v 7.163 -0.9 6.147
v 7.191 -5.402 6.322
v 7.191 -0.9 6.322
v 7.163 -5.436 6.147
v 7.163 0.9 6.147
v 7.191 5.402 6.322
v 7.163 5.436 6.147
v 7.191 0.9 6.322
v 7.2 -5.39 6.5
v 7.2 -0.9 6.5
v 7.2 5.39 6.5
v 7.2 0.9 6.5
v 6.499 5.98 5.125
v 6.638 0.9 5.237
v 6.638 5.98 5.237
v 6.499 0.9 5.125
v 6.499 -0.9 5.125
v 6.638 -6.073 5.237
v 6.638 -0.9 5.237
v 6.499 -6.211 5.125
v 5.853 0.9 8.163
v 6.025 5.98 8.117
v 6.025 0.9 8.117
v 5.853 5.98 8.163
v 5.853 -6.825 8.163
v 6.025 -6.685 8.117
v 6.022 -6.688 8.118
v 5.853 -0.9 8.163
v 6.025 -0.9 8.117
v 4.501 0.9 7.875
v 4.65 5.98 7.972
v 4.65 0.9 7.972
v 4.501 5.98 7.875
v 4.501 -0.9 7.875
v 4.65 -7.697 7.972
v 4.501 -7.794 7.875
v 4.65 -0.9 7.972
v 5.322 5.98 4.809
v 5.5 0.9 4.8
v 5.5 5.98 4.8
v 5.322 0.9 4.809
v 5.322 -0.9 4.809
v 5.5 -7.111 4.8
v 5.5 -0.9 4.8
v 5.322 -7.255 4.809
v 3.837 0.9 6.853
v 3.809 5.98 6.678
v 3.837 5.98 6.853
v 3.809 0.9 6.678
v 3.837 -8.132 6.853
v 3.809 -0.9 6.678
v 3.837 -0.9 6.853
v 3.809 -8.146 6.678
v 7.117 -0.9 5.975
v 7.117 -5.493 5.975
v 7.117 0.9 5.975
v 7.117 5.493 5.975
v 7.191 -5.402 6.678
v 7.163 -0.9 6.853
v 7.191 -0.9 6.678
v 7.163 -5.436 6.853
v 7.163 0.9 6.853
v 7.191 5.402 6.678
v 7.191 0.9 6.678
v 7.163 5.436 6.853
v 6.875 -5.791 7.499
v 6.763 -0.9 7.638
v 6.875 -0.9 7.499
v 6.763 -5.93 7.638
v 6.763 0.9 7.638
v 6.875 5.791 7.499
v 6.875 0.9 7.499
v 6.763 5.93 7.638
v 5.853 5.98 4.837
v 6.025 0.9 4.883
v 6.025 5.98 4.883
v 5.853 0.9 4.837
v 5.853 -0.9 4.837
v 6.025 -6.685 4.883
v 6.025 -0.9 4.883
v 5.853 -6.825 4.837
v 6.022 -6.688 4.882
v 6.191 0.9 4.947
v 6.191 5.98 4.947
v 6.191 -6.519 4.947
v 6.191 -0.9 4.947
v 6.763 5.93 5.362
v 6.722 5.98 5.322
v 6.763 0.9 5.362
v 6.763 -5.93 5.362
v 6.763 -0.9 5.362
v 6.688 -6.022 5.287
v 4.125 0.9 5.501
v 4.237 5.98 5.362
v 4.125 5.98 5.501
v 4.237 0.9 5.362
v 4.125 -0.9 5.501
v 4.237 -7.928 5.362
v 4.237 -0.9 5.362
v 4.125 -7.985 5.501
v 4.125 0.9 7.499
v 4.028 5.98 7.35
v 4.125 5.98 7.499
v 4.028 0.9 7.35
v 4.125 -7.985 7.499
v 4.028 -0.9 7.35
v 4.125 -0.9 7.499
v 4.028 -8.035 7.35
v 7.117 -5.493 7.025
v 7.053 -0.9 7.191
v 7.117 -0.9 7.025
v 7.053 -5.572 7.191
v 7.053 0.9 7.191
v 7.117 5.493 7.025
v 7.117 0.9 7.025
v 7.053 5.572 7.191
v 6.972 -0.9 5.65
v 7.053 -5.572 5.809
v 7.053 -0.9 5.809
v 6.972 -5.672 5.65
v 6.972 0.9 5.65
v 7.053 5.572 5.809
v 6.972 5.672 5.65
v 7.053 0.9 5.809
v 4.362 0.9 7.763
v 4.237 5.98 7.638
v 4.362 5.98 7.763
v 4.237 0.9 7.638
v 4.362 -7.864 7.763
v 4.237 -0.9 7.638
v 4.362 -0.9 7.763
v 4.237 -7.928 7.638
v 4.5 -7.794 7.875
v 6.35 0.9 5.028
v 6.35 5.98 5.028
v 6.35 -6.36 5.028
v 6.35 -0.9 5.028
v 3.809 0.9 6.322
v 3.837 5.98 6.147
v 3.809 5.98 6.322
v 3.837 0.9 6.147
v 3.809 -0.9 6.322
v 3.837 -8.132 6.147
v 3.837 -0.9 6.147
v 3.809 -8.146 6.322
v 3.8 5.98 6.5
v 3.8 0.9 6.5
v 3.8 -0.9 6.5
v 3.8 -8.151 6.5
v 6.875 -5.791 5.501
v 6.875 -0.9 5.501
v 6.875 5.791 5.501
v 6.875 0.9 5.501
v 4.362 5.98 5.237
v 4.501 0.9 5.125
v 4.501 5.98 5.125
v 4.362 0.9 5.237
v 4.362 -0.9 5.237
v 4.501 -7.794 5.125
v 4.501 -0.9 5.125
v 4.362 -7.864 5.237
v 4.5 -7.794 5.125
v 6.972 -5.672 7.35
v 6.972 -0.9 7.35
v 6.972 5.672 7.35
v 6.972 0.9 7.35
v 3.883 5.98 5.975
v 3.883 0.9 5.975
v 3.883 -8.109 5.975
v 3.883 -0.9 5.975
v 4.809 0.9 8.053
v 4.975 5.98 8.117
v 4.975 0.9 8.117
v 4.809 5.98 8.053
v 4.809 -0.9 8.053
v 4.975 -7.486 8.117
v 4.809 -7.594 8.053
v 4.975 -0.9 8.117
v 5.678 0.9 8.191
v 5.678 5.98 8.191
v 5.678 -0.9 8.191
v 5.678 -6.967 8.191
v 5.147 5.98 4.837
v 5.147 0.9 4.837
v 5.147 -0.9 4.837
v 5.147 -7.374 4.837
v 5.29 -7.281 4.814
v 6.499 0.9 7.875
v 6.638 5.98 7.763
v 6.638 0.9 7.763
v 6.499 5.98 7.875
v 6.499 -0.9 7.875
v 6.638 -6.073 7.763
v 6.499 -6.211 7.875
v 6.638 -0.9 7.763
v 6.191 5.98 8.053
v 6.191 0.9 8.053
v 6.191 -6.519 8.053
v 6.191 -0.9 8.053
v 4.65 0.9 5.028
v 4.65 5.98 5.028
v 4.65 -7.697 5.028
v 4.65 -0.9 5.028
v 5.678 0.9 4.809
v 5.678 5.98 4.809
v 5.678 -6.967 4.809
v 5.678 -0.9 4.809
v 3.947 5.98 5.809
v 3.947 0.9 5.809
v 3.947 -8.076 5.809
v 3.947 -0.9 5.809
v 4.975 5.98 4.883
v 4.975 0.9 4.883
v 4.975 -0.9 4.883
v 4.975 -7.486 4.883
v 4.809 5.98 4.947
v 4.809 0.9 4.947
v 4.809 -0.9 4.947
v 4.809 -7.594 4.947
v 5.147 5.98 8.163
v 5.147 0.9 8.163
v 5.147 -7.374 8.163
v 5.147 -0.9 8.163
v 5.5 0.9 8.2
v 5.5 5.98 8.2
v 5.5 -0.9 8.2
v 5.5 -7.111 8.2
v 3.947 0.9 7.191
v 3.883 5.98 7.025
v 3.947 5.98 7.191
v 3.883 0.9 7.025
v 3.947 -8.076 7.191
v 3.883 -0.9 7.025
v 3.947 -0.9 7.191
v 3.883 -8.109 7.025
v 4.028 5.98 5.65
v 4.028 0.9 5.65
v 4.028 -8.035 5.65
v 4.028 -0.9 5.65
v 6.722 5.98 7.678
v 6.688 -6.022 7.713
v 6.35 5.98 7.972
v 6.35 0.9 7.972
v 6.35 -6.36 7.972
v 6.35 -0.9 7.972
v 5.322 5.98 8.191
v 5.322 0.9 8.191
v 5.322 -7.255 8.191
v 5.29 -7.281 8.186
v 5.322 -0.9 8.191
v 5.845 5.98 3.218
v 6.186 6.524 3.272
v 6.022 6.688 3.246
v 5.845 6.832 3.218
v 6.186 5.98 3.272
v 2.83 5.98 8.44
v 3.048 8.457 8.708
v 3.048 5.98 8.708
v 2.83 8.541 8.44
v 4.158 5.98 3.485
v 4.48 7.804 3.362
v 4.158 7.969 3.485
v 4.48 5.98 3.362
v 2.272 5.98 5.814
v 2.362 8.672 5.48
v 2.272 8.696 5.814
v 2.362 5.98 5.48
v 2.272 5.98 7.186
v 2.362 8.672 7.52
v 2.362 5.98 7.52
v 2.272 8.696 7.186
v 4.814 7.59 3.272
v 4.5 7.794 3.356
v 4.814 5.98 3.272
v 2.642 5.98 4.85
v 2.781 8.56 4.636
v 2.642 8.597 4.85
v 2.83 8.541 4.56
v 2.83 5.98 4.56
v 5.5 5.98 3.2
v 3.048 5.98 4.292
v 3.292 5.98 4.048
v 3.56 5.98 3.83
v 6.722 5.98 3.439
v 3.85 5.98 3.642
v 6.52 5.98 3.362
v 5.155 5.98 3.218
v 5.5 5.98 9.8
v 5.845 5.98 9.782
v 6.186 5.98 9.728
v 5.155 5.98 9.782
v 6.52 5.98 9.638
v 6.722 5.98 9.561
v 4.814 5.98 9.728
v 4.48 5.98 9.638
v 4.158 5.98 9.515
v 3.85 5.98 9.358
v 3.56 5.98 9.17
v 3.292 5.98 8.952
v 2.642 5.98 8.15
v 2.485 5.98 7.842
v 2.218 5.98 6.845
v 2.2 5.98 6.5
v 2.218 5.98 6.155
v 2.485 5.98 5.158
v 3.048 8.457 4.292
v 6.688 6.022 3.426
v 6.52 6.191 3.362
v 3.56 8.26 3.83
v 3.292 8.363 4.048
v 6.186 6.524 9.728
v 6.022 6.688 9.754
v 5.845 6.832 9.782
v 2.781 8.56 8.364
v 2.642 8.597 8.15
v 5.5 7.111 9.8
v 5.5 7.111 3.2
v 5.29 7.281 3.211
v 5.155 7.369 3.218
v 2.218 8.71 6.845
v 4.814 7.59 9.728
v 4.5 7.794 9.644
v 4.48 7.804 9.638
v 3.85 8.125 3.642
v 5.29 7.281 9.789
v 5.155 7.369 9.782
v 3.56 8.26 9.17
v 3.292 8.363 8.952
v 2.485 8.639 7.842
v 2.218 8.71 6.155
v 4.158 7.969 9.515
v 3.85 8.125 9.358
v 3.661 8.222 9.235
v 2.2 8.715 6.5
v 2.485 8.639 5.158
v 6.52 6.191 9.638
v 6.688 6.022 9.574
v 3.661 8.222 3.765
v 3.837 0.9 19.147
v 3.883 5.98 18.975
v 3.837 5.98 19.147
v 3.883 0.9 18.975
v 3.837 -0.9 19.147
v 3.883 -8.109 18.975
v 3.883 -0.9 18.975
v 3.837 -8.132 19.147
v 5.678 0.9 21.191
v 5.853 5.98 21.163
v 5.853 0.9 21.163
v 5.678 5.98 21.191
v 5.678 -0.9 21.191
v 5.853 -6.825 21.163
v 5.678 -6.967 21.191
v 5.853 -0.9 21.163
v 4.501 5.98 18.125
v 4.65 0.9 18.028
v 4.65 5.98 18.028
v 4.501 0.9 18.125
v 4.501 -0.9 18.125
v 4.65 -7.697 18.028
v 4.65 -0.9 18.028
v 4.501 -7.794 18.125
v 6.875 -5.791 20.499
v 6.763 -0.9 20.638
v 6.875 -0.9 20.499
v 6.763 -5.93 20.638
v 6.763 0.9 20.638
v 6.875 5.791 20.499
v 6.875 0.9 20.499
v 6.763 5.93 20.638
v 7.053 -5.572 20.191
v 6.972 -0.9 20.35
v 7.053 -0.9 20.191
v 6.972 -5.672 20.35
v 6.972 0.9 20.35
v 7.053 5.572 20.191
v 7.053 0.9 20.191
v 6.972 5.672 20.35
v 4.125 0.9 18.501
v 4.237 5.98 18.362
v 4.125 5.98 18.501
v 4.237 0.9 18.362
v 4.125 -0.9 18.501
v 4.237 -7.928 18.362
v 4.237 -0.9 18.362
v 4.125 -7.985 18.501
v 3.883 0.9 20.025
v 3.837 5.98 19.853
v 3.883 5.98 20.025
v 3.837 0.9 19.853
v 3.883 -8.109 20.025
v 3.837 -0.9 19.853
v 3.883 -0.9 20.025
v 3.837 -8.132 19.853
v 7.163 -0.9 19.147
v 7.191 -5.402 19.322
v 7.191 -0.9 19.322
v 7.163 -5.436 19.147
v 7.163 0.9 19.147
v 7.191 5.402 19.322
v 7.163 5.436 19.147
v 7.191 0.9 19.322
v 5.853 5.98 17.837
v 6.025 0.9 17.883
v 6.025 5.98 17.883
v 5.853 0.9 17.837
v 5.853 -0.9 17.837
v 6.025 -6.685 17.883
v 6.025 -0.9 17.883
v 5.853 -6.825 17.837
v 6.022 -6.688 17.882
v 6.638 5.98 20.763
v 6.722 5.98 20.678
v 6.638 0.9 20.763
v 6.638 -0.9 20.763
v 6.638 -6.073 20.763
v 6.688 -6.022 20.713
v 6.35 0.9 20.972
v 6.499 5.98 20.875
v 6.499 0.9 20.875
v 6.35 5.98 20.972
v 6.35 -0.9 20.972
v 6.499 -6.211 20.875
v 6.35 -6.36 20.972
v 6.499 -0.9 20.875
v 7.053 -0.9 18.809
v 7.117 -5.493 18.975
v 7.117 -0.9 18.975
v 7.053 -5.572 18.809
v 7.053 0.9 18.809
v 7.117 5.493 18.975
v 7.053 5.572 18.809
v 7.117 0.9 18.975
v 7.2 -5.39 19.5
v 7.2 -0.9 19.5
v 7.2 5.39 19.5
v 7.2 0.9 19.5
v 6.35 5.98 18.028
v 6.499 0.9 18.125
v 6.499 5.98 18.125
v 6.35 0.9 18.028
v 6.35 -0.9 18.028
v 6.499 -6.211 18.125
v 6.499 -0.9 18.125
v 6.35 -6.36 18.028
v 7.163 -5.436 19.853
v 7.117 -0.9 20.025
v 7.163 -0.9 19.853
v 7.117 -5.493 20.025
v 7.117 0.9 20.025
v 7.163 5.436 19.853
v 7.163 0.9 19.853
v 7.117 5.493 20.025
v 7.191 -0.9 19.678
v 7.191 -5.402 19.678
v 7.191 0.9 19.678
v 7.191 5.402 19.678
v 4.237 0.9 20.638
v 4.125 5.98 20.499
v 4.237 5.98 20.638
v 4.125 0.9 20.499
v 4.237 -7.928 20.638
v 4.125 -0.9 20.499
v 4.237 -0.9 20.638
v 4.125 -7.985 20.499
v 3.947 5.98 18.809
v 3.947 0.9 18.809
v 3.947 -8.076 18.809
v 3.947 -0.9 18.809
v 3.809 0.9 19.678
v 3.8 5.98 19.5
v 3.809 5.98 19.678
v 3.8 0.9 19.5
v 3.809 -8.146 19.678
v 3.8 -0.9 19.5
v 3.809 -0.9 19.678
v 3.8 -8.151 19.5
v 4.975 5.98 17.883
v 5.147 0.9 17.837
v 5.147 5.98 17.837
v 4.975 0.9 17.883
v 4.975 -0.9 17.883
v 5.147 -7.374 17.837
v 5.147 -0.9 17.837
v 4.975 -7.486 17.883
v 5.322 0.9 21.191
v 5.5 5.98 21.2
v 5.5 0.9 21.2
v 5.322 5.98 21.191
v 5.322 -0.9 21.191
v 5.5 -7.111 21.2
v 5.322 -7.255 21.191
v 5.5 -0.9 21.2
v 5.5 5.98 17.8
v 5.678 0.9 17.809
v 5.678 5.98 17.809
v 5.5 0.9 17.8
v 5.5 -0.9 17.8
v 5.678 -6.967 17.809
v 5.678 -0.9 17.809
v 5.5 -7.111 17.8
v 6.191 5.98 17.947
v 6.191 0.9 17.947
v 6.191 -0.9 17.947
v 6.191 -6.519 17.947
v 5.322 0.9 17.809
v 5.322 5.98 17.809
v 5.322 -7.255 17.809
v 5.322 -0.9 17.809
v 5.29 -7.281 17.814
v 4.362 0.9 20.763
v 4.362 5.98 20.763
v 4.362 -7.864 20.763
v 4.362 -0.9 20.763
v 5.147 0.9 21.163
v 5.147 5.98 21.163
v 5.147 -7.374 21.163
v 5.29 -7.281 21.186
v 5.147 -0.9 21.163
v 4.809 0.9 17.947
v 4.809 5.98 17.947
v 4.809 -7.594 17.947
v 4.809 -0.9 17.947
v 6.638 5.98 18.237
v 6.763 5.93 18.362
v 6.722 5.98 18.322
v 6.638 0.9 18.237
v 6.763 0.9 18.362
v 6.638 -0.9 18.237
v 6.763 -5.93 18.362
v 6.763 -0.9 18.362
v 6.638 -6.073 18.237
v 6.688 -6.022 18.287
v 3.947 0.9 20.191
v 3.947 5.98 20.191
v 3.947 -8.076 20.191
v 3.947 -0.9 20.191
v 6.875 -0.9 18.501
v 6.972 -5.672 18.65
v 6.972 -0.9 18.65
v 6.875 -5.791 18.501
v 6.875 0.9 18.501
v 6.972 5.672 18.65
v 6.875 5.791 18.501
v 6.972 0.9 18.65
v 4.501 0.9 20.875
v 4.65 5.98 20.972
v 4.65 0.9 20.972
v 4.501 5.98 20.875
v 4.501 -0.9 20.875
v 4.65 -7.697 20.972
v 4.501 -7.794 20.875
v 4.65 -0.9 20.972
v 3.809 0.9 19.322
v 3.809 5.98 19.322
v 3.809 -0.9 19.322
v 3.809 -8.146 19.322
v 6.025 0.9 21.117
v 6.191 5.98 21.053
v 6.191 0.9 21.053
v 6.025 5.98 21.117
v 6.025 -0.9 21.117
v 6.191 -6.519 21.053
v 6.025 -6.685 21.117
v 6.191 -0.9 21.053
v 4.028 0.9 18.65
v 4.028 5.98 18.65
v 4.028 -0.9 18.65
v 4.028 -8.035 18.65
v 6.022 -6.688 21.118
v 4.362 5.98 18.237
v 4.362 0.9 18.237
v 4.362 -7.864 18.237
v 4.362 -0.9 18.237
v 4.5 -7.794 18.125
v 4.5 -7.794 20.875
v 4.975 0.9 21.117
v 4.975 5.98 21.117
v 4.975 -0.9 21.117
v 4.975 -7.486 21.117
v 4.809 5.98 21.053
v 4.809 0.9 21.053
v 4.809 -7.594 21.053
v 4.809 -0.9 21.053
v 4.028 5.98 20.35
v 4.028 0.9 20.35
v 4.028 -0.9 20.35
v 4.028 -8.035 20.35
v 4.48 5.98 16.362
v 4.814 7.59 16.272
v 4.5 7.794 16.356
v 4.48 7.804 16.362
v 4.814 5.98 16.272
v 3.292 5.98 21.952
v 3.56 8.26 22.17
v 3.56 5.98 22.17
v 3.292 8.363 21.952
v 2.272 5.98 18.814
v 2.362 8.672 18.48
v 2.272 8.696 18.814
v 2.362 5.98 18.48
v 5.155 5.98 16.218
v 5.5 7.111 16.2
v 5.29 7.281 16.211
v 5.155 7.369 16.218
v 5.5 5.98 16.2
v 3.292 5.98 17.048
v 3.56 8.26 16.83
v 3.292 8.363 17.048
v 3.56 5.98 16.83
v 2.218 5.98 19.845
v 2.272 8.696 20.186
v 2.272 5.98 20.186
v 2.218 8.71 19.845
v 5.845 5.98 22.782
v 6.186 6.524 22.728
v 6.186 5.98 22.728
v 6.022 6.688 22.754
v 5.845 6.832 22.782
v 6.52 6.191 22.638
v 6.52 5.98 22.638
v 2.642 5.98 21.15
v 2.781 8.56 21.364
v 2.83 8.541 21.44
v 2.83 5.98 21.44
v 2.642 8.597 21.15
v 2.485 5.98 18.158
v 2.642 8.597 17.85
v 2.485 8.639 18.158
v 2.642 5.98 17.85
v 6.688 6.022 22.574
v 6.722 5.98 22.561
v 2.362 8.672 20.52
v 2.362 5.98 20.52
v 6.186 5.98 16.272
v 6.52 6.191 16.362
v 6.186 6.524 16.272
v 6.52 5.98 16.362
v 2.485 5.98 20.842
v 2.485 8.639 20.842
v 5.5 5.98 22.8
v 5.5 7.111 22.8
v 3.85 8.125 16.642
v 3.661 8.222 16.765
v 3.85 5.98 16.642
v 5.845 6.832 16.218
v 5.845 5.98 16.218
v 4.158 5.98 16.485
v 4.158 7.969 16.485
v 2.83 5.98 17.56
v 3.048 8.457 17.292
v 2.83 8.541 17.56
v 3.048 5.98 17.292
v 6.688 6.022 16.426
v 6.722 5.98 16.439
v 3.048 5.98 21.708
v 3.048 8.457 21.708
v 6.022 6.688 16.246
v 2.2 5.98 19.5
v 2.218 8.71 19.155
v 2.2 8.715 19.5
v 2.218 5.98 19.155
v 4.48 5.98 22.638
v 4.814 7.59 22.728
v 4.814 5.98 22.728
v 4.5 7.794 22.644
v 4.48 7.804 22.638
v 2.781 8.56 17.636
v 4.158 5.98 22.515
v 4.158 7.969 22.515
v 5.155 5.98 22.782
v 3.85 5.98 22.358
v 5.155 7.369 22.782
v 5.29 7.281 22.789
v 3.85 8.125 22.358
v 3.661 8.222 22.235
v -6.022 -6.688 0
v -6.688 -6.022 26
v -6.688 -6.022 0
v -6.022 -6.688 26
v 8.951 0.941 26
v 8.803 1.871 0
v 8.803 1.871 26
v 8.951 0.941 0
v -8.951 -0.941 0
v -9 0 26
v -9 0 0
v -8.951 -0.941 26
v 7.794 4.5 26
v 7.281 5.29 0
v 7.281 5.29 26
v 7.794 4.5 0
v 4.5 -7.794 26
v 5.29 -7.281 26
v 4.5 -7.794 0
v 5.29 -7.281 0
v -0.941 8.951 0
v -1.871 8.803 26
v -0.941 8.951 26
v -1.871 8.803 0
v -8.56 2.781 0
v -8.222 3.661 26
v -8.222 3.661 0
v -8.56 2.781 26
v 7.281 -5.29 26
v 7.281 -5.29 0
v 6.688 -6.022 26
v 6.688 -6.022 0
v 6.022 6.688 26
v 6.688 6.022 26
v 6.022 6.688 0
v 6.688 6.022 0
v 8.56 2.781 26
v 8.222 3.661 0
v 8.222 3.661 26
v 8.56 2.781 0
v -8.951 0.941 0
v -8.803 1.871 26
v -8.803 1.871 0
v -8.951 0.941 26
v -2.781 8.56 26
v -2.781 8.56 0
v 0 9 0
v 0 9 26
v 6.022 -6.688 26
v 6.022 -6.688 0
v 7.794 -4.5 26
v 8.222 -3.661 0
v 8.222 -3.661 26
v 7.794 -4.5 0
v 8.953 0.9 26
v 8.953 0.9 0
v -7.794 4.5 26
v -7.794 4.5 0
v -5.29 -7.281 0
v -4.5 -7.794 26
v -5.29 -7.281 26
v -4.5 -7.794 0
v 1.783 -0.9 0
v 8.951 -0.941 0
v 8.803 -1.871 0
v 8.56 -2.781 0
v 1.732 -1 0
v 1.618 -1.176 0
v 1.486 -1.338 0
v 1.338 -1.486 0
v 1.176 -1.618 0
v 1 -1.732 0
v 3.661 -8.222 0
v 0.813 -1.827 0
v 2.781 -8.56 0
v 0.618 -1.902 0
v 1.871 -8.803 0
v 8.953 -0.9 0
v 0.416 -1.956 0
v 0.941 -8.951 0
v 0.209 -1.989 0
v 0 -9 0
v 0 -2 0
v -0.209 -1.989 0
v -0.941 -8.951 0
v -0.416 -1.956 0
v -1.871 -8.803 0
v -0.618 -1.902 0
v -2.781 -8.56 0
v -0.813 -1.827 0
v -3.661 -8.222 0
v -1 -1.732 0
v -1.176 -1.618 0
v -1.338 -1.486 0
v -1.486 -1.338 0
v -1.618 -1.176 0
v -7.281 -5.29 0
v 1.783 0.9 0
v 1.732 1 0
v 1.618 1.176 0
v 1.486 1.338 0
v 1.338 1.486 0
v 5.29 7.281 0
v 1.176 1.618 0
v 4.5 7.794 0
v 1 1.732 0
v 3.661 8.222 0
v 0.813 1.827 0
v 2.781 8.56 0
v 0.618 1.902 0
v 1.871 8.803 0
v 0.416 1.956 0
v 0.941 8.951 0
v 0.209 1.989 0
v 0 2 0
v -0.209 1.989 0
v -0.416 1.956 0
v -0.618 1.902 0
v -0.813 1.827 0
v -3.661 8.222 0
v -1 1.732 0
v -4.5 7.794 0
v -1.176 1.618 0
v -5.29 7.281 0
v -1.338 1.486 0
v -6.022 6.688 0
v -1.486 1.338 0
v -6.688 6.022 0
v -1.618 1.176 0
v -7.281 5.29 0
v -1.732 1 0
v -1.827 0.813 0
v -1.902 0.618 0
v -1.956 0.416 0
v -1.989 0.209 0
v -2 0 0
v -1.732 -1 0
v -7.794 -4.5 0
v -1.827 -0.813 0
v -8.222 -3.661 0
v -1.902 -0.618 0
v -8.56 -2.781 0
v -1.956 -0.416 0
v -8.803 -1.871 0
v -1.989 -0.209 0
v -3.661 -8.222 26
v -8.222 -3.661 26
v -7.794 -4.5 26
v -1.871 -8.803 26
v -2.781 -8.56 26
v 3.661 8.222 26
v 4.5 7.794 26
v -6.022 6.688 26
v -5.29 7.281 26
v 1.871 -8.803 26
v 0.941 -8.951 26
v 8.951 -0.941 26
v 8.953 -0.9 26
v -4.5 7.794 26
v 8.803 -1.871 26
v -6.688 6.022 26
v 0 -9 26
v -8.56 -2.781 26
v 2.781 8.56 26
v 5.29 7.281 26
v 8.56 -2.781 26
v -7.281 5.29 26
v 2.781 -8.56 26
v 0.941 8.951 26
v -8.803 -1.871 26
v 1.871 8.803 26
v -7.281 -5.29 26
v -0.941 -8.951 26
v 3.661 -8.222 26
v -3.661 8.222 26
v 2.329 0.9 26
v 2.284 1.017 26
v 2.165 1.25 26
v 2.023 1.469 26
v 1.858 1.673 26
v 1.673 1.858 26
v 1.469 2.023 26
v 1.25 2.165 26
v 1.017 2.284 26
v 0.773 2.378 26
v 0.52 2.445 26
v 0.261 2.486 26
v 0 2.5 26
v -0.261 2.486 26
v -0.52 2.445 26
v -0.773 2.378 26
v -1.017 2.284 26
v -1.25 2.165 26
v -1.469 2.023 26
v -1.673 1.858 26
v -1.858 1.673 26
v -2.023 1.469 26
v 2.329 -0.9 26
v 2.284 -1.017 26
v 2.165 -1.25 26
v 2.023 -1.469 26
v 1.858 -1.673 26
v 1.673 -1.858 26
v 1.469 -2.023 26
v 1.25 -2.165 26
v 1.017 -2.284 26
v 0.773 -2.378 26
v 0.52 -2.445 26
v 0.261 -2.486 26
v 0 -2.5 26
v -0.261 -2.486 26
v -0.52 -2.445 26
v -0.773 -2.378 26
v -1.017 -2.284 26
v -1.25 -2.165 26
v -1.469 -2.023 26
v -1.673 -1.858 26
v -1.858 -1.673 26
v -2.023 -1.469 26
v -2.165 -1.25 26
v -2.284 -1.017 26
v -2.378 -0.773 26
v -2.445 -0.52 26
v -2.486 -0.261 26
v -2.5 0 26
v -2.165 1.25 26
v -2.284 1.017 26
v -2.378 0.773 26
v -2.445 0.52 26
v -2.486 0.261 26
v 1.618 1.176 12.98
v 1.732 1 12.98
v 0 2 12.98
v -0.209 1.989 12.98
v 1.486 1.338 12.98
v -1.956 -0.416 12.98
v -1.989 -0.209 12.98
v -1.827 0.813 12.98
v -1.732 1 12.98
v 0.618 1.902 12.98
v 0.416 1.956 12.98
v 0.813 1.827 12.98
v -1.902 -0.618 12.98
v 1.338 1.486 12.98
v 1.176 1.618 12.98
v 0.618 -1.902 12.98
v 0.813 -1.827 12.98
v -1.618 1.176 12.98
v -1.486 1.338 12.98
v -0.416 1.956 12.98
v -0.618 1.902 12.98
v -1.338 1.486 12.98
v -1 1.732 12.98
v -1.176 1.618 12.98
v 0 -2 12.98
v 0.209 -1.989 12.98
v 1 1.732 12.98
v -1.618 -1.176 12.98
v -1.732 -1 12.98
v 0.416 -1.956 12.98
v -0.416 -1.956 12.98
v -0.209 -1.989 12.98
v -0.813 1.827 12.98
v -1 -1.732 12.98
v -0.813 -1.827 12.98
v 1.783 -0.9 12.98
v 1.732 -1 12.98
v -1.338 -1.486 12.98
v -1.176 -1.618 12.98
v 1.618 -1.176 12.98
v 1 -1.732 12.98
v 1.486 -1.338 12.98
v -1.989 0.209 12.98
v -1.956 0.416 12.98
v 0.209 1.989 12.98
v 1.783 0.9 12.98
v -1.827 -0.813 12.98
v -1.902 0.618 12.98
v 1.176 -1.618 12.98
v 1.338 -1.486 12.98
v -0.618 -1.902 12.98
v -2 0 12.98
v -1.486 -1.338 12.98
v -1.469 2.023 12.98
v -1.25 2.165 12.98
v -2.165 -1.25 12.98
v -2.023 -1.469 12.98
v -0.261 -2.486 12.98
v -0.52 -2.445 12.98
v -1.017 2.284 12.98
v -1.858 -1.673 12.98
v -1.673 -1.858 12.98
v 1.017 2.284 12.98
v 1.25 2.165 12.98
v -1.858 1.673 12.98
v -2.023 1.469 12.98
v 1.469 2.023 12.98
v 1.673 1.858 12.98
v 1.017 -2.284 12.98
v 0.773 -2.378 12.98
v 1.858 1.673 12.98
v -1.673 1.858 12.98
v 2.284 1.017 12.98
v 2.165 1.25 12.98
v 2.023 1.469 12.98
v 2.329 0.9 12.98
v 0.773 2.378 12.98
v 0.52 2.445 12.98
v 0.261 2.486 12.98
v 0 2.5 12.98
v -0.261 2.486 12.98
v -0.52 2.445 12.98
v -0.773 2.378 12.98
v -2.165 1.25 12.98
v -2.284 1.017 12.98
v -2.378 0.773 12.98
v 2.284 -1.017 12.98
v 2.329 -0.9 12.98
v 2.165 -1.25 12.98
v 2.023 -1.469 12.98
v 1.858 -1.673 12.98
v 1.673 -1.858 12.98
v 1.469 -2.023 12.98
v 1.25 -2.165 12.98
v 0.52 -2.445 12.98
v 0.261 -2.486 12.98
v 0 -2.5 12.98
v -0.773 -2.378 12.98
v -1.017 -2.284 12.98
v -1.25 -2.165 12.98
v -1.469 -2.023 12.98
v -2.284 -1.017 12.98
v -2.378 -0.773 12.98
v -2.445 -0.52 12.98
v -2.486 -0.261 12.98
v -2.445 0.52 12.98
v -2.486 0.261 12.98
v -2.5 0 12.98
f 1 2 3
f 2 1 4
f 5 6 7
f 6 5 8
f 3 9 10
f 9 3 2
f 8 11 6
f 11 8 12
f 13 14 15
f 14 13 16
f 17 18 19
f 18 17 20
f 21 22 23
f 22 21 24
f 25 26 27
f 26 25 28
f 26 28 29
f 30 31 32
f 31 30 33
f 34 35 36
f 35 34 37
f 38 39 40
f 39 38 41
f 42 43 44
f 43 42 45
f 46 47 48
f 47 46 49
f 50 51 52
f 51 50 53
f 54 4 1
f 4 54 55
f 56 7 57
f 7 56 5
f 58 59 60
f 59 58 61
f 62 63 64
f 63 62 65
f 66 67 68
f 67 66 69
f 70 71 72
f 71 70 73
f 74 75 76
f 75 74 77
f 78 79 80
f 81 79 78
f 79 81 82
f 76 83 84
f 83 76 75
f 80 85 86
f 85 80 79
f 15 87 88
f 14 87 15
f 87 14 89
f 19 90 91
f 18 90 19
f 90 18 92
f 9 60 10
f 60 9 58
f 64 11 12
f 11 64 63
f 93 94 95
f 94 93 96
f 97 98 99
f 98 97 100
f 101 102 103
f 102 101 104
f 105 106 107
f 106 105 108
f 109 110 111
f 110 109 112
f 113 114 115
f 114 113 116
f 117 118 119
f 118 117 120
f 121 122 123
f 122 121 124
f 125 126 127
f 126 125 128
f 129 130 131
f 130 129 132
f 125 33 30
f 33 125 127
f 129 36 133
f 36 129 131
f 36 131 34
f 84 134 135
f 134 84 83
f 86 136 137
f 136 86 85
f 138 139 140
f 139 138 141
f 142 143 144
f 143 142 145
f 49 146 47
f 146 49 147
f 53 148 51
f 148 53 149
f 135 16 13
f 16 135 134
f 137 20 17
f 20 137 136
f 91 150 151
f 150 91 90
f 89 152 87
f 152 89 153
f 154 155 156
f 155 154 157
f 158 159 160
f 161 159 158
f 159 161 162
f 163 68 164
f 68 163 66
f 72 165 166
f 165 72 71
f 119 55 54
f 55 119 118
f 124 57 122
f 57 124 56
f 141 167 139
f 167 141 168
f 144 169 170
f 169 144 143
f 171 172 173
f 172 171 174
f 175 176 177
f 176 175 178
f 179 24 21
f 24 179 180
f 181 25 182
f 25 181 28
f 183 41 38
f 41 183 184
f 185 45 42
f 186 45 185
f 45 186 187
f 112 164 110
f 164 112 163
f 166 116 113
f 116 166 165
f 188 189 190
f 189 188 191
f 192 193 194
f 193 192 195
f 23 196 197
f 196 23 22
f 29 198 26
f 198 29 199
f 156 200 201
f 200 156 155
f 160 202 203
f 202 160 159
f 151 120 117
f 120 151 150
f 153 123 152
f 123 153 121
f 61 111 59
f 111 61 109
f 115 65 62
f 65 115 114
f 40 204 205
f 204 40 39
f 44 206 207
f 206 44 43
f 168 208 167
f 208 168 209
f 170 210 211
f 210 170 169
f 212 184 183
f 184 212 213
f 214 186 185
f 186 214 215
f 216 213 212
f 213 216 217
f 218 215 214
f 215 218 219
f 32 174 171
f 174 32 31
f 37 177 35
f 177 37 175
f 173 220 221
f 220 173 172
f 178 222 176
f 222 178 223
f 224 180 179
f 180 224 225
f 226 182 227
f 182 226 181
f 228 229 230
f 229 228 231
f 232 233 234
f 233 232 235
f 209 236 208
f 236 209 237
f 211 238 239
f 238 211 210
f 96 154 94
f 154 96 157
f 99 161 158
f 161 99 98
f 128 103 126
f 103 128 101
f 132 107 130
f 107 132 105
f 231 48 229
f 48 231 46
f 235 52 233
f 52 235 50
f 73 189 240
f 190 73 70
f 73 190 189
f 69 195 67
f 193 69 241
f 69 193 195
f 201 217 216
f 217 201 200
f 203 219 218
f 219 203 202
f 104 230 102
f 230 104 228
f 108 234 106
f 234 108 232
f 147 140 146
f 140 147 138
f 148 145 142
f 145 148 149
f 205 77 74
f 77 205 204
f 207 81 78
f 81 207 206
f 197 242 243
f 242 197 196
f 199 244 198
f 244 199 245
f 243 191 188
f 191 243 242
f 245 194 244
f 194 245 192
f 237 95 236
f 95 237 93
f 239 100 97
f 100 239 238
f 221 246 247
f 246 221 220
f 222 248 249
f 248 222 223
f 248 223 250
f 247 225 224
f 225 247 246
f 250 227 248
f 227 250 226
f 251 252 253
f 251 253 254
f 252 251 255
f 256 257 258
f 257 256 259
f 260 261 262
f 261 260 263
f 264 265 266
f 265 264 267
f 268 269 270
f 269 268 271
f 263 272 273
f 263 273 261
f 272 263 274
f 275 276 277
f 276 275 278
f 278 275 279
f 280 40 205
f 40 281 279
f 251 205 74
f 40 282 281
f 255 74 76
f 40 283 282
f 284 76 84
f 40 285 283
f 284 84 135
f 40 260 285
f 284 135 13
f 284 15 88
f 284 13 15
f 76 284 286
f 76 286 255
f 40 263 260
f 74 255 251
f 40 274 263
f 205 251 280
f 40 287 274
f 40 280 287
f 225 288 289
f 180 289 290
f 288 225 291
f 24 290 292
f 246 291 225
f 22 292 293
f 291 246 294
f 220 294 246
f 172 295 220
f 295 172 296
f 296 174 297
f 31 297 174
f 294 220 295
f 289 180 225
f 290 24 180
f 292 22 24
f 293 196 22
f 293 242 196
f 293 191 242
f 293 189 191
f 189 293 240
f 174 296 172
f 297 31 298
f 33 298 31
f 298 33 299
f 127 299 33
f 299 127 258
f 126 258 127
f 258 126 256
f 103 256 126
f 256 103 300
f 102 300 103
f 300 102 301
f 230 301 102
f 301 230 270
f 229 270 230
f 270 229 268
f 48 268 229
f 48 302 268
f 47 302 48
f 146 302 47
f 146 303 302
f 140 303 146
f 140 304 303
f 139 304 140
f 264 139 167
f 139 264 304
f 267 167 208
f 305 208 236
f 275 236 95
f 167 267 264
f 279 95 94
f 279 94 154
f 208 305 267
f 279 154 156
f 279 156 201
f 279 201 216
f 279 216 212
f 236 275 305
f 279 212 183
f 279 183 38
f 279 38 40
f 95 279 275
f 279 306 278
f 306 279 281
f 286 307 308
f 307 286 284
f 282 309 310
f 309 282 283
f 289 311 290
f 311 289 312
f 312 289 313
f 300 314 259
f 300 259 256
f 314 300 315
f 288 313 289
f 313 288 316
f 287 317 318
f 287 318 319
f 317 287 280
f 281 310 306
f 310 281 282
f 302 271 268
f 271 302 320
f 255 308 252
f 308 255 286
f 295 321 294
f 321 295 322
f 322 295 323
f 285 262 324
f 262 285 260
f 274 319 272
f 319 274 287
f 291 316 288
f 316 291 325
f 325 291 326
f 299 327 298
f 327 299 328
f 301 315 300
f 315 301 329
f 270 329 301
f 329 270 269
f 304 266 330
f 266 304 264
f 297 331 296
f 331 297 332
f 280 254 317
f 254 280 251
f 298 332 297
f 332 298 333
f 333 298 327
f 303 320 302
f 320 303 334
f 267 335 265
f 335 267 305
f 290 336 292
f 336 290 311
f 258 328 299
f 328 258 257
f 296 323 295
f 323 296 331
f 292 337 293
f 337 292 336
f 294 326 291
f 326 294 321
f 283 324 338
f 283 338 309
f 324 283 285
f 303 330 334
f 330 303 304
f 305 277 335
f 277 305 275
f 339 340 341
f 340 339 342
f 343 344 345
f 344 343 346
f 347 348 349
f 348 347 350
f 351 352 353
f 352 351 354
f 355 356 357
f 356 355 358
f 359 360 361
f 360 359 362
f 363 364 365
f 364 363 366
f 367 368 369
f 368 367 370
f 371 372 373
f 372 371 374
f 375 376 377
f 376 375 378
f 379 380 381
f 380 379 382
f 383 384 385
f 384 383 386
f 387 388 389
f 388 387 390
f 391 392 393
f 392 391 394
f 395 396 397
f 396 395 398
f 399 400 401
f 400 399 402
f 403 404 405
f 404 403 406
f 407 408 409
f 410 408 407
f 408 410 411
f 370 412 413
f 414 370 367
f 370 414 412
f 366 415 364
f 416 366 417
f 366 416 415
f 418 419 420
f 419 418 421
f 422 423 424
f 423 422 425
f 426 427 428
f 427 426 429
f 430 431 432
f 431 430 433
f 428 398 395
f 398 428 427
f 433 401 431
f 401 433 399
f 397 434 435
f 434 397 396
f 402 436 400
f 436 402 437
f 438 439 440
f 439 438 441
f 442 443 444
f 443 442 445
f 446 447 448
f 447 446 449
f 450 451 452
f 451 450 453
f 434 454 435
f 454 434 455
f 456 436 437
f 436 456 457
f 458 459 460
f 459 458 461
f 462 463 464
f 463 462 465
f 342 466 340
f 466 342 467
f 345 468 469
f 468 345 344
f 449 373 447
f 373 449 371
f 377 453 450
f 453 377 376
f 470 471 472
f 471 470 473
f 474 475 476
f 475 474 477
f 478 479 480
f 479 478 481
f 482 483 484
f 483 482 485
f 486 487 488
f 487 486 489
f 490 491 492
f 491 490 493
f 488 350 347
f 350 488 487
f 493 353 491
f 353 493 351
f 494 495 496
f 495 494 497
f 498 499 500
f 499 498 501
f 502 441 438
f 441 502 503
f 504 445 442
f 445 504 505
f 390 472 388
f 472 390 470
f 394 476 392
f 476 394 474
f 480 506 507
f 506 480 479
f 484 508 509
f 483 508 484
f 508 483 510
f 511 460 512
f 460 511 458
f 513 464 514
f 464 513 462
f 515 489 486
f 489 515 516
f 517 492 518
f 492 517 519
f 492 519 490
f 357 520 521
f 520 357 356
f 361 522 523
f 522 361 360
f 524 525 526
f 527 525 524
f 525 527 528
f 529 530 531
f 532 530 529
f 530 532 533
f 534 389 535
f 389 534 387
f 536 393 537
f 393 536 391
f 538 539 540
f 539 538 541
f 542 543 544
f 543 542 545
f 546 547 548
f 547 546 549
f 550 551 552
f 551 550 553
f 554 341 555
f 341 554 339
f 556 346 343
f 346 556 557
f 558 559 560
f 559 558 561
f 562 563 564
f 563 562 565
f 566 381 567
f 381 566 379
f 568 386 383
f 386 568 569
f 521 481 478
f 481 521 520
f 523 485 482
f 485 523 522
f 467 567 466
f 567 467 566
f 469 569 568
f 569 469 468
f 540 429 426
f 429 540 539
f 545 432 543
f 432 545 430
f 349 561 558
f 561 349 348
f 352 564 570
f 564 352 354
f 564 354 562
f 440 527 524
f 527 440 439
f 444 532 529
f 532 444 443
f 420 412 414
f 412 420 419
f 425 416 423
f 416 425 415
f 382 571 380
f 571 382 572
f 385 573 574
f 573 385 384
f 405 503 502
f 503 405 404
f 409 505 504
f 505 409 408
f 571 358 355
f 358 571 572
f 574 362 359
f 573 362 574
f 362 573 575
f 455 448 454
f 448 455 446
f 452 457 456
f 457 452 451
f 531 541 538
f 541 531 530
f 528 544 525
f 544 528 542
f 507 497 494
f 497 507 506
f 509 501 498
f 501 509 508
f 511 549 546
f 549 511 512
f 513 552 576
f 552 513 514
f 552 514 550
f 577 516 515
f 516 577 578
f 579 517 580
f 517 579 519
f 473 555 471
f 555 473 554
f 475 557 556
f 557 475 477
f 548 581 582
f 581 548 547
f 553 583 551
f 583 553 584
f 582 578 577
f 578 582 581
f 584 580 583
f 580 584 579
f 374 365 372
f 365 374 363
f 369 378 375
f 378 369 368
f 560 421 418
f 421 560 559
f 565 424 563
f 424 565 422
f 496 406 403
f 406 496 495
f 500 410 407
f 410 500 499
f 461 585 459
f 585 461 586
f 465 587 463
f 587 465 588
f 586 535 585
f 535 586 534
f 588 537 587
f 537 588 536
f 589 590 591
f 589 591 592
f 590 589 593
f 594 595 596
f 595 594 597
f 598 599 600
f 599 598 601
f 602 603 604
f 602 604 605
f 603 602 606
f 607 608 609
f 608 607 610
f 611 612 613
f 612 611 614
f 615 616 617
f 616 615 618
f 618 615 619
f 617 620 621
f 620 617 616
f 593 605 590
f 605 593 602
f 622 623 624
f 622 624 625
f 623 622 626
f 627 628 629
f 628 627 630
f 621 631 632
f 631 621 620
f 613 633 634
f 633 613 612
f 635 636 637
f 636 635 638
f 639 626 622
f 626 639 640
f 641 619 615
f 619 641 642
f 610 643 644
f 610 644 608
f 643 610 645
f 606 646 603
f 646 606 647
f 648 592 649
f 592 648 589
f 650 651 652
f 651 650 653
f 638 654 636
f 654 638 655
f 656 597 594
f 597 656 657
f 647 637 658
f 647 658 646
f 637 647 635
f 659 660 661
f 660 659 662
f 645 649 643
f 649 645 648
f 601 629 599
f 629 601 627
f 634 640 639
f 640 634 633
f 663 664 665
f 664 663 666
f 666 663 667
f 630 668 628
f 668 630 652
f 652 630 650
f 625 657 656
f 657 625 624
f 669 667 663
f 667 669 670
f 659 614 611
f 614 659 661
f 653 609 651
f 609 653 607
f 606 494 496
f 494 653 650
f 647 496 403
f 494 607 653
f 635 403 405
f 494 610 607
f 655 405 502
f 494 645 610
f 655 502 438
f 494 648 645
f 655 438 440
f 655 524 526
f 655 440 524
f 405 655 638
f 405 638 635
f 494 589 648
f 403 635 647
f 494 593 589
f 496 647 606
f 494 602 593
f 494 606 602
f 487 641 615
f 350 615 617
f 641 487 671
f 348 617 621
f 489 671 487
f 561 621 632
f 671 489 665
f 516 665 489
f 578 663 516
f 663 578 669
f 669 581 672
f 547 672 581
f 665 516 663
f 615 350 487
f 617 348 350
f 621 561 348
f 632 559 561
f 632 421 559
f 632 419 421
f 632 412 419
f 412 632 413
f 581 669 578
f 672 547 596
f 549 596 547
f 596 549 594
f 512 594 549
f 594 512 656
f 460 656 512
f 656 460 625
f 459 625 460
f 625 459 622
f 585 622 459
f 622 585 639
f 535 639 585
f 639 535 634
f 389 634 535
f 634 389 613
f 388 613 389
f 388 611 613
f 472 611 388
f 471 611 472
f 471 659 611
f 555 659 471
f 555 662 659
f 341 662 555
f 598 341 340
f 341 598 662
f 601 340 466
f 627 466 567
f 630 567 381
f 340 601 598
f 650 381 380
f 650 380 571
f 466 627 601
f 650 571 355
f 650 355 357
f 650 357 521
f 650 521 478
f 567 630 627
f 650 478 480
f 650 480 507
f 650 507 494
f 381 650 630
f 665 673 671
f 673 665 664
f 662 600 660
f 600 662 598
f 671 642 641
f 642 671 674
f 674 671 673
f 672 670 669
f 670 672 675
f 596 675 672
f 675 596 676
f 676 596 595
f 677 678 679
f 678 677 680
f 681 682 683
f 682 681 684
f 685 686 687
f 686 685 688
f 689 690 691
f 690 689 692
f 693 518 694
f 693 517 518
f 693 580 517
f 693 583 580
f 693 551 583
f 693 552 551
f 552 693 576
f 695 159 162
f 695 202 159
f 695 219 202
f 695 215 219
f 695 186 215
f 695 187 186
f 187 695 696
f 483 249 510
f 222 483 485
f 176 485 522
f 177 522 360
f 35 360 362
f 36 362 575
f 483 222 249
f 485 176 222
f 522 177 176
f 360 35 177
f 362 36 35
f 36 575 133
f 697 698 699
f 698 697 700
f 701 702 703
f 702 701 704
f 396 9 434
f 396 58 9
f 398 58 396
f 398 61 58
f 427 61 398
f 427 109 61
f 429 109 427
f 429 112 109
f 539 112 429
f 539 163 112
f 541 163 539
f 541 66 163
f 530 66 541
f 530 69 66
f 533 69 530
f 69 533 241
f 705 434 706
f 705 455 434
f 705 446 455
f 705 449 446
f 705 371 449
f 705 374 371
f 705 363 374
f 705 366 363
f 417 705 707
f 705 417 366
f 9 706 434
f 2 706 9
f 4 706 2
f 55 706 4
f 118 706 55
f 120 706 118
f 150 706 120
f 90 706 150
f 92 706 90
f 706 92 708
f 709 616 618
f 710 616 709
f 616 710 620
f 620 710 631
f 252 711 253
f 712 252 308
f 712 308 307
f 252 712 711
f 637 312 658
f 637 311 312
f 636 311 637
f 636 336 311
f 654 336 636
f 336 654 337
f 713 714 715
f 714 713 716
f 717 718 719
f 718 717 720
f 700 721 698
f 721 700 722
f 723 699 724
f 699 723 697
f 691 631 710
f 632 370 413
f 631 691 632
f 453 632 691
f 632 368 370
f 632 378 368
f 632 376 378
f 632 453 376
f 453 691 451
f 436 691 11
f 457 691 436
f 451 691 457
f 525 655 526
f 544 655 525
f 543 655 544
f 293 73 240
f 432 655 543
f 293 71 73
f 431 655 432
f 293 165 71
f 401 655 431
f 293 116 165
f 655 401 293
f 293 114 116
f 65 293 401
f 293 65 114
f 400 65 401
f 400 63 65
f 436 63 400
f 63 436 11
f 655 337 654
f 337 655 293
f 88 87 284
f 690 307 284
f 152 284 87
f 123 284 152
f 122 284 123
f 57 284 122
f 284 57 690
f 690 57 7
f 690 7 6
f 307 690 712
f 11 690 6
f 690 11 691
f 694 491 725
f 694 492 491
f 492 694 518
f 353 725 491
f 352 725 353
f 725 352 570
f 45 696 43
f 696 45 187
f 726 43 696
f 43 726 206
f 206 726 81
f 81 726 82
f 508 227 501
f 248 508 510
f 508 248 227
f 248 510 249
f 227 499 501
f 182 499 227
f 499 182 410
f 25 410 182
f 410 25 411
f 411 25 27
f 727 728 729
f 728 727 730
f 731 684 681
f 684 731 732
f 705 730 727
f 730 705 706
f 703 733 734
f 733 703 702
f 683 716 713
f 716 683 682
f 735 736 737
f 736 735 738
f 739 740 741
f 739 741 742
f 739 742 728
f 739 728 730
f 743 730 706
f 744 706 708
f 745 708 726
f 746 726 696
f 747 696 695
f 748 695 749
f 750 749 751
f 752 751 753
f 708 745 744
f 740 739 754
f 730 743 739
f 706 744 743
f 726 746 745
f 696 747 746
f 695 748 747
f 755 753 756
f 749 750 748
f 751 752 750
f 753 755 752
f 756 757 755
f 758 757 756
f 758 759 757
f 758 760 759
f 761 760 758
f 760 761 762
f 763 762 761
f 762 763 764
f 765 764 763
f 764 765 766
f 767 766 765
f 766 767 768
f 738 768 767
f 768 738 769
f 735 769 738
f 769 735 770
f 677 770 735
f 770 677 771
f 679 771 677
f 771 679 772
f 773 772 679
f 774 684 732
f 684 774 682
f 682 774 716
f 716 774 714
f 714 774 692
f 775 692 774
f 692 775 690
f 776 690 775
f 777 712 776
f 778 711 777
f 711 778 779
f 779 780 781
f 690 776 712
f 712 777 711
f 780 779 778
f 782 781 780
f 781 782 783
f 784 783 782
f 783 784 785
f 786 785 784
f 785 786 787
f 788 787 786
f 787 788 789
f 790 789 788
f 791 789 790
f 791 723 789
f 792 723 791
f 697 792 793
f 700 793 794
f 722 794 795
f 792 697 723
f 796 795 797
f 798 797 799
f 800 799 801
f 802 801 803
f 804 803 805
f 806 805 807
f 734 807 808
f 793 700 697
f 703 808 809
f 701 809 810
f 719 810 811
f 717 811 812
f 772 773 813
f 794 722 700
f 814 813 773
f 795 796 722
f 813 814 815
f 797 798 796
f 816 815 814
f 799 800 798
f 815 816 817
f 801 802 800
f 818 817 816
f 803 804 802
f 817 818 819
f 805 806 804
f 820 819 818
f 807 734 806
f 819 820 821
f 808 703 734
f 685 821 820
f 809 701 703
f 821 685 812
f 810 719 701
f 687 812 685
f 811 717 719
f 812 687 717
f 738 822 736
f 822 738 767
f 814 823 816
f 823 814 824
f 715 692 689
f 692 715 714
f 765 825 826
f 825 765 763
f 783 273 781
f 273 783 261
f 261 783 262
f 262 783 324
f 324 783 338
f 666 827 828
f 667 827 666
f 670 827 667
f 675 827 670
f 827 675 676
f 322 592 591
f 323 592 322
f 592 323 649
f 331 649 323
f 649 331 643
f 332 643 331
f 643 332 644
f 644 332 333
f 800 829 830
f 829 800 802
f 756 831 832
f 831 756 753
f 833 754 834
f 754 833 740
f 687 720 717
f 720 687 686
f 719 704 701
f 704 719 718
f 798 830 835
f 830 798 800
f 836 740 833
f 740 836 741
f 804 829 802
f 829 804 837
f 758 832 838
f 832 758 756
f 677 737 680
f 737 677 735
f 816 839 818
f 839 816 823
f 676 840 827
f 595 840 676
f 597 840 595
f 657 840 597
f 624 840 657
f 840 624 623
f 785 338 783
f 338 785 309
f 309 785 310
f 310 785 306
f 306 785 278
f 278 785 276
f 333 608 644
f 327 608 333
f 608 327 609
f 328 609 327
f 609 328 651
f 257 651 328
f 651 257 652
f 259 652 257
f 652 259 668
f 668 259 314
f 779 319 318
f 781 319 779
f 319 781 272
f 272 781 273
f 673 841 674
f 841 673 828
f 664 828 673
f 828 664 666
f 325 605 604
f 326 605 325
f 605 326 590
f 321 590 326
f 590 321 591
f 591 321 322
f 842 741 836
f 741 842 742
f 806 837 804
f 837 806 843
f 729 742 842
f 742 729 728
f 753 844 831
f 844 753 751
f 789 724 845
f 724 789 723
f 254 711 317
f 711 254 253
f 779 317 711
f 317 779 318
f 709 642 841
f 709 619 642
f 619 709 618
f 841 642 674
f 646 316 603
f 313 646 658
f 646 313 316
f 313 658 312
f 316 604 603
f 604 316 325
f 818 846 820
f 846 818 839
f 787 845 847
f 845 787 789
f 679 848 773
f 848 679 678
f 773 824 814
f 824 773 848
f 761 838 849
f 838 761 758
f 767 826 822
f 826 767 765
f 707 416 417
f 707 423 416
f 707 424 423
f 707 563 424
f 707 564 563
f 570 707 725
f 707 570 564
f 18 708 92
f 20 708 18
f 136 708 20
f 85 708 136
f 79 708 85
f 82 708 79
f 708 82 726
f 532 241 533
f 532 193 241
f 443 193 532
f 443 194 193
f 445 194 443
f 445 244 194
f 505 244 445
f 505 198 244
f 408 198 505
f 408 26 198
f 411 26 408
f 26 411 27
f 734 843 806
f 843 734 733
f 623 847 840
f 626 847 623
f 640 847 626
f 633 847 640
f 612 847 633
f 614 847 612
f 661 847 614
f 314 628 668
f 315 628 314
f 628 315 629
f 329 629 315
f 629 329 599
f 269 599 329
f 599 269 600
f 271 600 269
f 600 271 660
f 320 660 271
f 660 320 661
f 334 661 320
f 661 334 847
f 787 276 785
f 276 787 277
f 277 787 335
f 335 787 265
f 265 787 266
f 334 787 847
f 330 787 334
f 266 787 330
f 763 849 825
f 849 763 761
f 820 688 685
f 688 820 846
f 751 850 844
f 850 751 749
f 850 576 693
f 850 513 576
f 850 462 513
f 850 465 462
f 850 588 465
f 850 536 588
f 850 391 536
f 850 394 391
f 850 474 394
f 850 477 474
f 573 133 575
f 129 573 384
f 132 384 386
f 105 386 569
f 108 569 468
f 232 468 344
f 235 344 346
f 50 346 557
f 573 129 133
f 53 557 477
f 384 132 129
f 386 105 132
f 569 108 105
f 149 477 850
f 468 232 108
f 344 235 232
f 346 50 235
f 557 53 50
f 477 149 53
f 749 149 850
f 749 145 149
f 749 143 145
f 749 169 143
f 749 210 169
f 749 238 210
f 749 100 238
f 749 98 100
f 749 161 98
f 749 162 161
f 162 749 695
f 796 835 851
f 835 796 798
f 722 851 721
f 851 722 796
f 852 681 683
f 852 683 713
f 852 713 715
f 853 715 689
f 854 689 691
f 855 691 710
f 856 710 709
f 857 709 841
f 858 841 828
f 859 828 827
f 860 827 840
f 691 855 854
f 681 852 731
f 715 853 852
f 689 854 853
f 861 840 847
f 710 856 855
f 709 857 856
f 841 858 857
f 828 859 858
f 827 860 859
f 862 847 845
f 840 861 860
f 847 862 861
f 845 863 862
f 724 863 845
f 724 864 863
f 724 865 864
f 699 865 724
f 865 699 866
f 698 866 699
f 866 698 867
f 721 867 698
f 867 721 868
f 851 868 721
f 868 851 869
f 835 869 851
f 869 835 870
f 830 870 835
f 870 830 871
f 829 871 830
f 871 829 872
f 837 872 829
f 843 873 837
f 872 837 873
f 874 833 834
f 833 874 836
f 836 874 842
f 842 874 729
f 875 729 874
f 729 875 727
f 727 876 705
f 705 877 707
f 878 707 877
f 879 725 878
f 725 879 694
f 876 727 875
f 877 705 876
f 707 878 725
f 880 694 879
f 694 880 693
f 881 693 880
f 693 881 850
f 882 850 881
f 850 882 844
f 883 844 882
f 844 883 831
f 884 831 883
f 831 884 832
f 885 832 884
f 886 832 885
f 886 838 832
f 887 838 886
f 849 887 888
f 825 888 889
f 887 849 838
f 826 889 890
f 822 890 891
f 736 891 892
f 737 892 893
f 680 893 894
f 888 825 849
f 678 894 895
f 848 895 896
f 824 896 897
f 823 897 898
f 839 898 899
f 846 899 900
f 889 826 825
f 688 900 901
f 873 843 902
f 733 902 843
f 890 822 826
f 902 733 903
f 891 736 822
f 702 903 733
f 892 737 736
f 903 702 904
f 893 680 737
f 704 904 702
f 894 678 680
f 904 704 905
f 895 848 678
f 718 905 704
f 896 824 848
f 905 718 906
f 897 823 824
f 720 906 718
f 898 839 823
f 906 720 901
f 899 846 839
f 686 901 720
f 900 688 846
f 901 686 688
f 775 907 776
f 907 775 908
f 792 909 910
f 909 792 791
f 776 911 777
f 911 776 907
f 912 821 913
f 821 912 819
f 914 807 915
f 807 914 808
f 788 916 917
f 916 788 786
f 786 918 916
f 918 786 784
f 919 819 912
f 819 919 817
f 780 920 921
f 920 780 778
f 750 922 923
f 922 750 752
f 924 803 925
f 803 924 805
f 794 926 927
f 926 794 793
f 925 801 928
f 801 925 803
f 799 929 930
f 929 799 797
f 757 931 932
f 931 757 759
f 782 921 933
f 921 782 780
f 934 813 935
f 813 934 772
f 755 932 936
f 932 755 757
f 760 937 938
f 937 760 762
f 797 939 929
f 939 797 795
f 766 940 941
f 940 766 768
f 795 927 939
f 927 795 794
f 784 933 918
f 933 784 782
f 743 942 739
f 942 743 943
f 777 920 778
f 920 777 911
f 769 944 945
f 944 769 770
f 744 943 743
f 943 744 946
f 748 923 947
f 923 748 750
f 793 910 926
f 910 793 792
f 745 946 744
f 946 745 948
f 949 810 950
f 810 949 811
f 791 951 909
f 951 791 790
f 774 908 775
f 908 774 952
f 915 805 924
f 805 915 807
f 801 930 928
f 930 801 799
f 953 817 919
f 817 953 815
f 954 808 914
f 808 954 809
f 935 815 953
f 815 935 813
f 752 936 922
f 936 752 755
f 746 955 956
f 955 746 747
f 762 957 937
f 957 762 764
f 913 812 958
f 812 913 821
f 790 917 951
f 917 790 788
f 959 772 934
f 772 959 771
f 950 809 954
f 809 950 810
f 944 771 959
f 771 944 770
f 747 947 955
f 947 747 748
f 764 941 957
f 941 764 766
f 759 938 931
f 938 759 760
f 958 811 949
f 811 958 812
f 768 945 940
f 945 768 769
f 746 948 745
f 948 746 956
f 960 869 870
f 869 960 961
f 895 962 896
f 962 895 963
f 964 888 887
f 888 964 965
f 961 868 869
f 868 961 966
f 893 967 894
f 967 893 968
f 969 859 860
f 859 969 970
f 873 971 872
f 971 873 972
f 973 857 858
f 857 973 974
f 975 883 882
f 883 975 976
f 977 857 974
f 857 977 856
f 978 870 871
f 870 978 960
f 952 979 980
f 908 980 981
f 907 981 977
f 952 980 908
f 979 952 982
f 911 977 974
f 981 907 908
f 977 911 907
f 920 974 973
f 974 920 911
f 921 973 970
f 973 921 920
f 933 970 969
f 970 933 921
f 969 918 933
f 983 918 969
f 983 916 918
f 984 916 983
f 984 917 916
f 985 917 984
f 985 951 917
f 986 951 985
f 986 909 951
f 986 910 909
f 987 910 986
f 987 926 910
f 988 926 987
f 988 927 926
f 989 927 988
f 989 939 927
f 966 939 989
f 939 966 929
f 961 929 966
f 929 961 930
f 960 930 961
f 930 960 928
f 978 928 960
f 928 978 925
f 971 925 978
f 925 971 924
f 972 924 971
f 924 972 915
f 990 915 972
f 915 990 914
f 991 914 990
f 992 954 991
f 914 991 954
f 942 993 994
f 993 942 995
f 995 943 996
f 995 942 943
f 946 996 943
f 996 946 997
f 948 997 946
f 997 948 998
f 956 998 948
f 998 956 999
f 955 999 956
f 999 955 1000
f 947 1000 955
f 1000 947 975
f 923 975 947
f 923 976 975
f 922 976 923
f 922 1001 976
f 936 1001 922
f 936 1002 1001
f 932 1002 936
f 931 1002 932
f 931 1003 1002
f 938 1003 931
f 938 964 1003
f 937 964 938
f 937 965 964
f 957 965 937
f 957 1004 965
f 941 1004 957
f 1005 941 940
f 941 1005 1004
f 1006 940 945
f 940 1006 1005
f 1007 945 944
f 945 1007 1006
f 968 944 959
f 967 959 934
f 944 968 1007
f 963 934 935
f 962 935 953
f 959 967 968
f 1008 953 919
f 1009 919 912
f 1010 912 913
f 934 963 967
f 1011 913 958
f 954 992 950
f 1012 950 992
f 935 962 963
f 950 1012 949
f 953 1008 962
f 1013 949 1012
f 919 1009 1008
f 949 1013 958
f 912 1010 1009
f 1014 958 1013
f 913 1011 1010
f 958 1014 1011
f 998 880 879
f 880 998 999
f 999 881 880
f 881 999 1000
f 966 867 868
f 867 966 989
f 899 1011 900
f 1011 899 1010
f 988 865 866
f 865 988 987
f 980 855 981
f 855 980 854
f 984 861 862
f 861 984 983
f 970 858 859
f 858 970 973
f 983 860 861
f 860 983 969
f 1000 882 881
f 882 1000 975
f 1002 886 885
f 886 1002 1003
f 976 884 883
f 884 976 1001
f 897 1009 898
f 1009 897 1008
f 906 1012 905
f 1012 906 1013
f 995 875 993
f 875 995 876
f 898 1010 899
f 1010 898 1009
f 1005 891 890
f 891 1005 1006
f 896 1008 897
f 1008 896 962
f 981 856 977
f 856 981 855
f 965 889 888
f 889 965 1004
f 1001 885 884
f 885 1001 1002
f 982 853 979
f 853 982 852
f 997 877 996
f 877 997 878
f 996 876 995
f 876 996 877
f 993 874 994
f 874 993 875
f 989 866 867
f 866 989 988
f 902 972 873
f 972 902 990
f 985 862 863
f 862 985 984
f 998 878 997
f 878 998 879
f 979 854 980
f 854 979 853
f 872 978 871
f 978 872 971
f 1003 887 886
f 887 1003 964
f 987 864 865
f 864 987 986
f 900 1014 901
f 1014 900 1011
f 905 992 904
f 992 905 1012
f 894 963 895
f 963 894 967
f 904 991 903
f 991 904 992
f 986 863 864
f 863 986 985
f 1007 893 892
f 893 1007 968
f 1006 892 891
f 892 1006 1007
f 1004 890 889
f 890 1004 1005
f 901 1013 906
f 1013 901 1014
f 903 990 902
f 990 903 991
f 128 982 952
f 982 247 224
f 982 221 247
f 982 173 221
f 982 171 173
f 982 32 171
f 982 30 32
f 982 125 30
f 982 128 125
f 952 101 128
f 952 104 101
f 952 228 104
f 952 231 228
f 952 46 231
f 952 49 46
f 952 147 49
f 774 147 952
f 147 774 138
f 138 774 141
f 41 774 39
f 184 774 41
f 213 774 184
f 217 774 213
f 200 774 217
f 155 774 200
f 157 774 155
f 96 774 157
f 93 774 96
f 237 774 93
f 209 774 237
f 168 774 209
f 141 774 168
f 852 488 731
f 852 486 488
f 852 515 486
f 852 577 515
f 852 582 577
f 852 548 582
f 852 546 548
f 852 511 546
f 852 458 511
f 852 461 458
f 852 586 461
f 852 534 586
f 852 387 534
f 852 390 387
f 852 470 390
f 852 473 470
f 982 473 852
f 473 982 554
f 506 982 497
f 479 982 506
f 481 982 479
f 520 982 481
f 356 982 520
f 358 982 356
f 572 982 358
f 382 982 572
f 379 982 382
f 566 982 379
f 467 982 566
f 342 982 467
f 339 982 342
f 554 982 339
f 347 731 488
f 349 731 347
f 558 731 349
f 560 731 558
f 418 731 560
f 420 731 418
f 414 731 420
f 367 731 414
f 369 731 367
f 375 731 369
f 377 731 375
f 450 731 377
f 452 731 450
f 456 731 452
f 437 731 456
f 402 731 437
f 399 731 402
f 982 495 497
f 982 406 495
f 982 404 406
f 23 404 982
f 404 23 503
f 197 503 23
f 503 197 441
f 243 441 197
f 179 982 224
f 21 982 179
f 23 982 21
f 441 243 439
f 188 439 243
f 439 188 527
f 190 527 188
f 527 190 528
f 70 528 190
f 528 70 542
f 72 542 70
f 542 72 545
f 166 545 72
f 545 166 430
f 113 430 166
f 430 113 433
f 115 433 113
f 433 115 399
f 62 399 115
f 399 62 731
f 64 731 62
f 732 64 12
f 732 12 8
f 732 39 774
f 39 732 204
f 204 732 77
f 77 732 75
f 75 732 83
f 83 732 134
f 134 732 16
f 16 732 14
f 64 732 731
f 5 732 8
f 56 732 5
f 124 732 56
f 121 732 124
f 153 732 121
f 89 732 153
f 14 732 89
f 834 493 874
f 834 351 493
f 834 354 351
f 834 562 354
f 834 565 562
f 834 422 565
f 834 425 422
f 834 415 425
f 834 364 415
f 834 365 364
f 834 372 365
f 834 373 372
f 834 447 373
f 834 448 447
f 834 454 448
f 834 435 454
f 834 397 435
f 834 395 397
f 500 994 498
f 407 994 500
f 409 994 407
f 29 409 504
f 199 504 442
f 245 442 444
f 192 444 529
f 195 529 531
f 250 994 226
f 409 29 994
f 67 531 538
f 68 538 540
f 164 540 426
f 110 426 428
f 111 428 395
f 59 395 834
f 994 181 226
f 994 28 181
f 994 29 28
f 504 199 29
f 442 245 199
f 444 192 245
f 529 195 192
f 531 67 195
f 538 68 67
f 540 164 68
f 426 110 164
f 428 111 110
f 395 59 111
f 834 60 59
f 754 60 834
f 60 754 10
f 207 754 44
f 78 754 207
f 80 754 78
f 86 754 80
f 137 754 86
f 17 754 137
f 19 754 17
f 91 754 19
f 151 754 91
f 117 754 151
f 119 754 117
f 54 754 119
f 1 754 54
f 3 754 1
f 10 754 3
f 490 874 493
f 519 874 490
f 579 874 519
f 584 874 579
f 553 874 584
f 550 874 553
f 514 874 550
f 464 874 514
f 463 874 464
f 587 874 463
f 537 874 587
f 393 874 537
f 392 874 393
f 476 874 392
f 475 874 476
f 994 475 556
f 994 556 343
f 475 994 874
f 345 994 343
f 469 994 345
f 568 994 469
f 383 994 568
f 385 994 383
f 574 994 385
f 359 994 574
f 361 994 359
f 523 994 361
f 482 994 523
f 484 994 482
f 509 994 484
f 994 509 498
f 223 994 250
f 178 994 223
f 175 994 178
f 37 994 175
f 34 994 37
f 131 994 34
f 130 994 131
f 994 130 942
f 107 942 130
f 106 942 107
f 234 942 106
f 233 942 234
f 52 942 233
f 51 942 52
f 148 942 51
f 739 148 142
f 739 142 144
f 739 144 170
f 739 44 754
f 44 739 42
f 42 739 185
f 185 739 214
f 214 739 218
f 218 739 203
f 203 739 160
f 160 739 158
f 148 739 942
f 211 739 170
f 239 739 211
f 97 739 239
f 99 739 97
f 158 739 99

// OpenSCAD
// Split shaft coupling 4 mm to 5 mm.
$fn = 60;
eps = 0.02;
shaft_a = 4;
shaft_b = 5;
outer_d = 18;
length = 26;
slit_w = 1.8;
screw_d = 3.4;
module clamp_hole(z) {
    translate([outer_d / 2 - 3.5, -outer_d / 2 - eps, z]) rotate([-90, 0, 0]) cylinder(d = screw_d, h = outer_d + 2 * eps);
    translate([outer_d / 2 - 3.5, outer_d / 2 - 3 - eps, z]) rotate([-90, 0, 0]) cylinder(d = 6.6, h = 3 + 2 * eps);
}
difference() {
    cylinder(d = outer_d, h = length);
    translate([0, 0, -eps]) cylinder(d = shaft_a, h = length / 2 + eps);
    translate([0, 0, length / 2 - eps]) cylinder(d = shaft_b, h = length / 2 + eps);
    translate([0, -slit_w / 2, -eps]) cube([outer_d / 2 + eps, slit_w, length + 2 * eps]);
    clamp_hole(length / 4);
    clamp_hole(3 * length / 4);
}
